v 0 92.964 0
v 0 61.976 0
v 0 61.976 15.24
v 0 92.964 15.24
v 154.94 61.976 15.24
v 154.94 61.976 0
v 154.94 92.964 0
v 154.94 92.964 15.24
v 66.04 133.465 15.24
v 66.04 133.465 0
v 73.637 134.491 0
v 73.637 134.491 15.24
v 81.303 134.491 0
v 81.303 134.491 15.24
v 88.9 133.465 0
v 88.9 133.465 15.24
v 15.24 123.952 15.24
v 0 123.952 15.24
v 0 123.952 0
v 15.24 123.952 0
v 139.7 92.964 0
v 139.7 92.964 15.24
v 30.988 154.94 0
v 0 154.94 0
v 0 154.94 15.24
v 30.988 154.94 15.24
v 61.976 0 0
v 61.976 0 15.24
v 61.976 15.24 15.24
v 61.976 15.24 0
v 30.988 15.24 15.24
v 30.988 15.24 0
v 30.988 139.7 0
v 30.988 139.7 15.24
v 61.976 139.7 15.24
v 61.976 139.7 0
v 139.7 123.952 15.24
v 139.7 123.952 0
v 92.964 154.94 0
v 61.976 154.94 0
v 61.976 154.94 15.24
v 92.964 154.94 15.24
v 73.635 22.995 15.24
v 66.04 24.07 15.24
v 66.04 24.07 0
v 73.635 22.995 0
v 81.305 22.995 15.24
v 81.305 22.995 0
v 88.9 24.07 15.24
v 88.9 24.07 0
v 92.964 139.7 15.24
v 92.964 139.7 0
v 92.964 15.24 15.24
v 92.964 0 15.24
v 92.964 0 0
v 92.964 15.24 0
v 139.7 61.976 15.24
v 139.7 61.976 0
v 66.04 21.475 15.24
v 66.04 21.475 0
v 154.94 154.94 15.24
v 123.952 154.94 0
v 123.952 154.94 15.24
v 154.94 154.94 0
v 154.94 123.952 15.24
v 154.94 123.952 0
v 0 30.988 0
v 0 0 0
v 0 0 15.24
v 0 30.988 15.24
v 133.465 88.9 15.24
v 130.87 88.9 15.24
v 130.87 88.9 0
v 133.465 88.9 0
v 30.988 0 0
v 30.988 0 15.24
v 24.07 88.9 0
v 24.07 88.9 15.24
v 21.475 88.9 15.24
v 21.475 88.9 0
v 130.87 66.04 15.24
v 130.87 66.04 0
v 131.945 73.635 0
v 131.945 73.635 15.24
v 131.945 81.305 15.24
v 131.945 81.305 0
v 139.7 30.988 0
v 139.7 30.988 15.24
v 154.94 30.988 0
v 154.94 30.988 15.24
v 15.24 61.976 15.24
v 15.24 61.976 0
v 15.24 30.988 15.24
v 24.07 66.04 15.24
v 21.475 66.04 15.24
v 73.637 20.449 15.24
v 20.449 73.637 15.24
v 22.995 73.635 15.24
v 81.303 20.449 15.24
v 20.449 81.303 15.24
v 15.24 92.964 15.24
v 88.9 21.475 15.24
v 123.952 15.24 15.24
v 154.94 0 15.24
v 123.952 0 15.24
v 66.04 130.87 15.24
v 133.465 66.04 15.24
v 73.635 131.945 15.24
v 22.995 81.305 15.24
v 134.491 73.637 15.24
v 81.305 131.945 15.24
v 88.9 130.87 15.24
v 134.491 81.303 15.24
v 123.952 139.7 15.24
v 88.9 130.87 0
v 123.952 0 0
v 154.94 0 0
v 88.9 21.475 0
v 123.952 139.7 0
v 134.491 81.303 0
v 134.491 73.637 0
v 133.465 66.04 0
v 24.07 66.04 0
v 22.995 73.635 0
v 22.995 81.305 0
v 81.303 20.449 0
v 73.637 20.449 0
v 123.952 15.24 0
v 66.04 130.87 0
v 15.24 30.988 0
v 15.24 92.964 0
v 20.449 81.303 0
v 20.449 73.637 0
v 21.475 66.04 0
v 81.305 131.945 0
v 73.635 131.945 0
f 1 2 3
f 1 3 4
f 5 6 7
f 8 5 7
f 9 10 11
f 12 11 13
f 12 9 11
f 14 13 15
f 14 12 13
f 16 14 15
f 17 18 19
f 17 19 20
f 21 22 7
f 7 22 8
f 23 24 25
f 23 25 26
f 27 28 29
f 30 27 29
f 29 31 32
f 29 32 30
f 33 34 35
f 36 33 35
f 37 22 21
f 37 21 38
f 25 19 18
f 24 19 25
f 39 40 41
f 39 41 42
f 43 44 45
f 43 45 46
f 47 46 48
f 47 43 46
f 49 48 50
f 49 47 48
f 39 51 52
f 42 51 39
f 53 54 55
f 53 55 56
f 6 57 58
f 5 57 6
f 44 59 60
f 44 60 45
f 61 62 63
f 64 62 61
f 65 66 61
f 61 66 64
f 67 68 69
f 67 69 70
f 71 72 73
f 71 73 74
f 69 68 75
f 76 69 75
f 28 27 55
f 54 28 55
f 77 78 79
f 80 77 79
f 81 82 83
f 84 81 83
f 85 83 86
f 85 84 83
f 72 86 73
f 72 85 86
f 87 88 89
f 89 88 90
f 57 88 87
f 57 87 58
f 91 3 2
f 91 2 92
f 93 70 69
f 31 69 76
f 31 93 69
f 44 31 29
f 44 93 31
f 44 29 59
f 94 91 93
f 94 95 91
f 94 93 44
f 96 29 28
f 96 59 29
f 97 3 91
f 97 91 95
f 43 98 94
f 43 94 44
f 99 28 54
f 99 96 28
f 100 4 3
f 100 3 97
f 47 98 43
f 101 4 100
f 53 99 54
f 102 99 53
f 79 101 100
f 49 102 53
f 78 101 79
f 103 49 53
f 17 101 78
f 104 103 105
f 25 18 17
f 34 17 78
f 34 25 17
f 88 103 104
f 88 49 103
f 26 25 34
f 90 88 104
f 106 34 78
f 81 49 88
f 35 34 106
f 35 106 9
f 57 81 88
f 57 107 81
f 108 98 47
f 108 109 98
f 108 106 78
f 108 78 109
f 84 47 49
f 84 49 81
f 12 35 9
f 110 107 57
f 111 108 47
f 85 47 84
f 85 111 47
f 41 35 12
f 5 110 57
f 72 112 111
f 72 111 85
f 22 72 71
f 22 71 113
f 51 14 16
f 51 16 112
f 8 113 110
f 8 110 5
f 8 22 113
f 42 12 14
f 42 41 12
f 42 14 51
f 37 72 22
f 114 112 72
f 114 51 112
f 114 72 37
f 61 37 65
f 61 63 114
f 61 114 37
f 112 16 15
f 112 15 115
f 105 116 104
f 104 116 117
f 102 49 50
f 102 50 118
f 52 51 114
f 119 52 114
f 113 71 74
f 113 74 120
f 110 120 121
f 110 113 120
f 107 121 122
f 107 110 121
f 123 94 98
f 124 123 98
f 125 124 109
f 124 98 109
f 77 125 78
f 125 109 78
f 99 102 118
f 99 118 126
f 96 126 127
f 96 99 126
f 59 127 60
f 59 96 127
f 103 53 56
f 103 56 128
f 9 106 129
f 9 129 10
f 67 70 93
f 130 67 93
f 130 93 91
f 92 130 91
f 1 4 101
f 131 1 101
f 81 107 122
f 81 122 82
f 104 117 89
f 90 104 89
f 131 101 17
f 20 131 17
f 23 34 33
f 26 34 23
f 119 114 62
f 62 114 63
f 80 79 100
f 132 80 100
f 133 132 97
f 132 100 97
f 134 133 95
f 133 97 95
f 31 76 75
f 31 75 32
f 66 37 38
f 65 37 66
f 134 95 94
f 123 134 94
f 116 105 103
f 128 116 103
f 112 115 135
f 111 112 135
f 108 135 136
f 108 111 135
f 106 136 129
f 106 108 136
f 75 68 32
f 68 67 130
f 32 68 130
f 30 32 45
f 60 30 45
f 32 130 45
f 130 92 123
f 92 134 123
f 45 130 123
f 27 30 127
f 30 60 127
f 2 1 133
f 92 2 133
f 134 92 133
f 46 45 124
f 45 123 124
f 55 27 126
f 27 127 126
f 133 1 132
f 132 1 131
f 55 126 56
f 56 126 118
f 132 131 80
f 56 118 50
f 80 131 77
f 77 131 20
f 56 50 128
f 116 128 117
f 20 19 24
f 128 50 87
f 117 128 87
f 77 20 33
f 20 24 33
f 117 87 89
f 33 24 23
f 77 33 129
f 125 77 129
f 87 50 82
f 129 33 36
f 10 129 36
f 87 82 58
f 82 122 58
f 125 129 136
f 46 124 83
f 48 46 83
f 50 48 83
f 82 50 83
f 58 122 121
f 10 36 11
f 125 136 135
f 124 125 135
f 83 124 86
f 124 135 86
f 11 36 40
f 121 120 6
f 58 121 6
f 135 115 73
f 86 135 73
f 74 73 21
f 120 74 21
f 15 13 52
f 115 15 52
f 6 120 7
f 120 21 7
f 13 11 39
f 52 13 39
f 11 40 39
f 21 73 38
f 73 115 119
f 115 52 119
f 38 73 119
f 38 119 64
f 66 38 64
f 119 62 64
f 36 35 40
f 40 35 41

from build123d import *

# Parameters (mm, degrees)
SKETCH1_W           = 154.94
SKETCH1_H           = 154.94
BOSS_EXTRUDE1_DEPTH = 15.24
SKETCH3_W           = 15.24
SKETCH3_H           = 30.988
SKETCH3_W_2         = 30.988
SKETCH3_H_2         = 15.24
CUT_EXTRUDE1_DEPTH  = 220.647592293
CUT_EXTRUDE2_DEPTH  = 220.647592293


with BuildPart() as part:
    # Sketch1 → Boss-Extrude1 (new body)
    with BuildSketch(Plane.XY):
        with Locations((77.47, 77.47)):
            Rectangle(SKETCH1_W, SKETCH1_H)
    extrude(amount=BOSS_EXTRUDE1_DEPTH)

    # Sketch3 → Cut-Extrude1 (cut, through all)
    with BuildSketch(Plane.XY.offset(15.24)):
        with Locations((7.62, 108.458)):
            Rectangle(SKETCH3_W, SKETCH3_H)
        with Locations((7.62, 46.482)):
            Rectangle(SKETCH3_W, SKETCH3_H)
        with Locations((147.32, 108.458)):
            Rectangle(SKETCH3_W, SKETCH3_H)
        with Locations((147.32, 46.482)):
            Rectangle(SKETCH3_W, SKETCH3_H)
        with Locations((46.482, 147.32)):
            Rectangle(SKETCH3_W_2, SKETCH3_H_2)
        with Locations((108.458, 147.32)):
            Rectangle(SKETCH3_W_2, SKETCH3_H_2)
        with Locations((46.482, 7.62)):
            Rectangle(SKETCH3_W_2, SKETCH3_H_2)
        with Locations((108.458, 7.62)):
            Rectangle(SKETCH3_W_2, SKETCH3_H_2)
    extrude(amount=-CUT_EXTRUDE1_DEPTH, mode=Mode.SUBTRACT)

    # Sketch7 → Cut-Extrude2 (cut, through all)
    with BuildSketch(Plane.XY.offset(15.24)):
        with BuildLine():
            Line((21.47466448, 66.04), (24.069558054, 66.04))
            ThreePointArc((24.069558054, 66.04), (22.86, 77.47), (24.069558054, 88.9))
            Line((24.069558054, 88.9), (21.47466448, 88.9))
            ThreePointArc((21.47466448, 88.9), (20.32, 77.47), (21.47466448, 66.04))
        make_face()
        with BuildLine():
            Line((88.9, 24.069558054), (88.9, 21.47466448))
            ThreePointArc((88.9, 21.47466448), (77.47, 20.32), (66.04, 21.47466448))
            Line((66.04, 21.47466448), (66.04, 24.069558054))
            ThreePointArc((66.04, 24.069558054), (77.47, 22.86), (88.9, 24.069558054))
        make_face()
        with BuildLine():
            Line((130.870441946, 88.9), (133.46533552, 88.9))
            ThreePointArc((133.46533552, 88.9), (134.62, 77.47), (133.46533552, 66.04))
            Line((133.46533552, 66.04), (130.870441946, 66.04))
            ThreePointArc((130.870441946, 66.04), (132.08, 77.47), (130.870441946, 88.9))
        make_face()
        with BuildLine():
            Line((88.9, 133.46533552), (88.9, 130.870441946))
            ThreePointArc((88.9, 130.870441946), (77.47, 132.08), (66.04, 130.870441946))
            Line((66.04, 130.870441946), (66.04, 133.46533552))
            ThreePointArc((66.04, 133.46533552), (77.47, 134.62), (88.9, 133.46533552))
        make_face()
    extrude(amount=-CUT_EXTRUDE2_DEPTH, mode=Mode.SUBTRACT)


solid = part.part
